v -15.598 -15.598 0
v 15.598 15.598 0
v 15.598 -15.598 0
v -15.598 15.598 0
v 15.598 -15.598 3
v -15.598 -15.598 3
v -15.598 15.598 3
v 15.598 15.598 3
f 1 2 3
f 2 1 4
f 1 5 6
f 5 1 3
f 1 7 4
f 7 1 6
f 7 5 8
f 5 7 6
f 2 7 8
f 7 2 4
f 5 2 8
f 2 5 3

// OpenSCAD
// Module names are of the form poly_<inkscape-path-id>().  As a result,
// you can associate a polygon in this OpenSCAD program with the corresponding
// SVG element in the Inkscape document by looking for the XML element with
// the attribute id="inkscape-path-id".

// fudge value is used to ensure that subtracted solids are a tad taller
// in the z dimension than the polygon being subtracted from.  This helps
// keep the resulting .stl file manifold.
fudge = 0.1;

module poly_path32(h)
{
  scale([25.4/90, -25.4/90, 1]) union()
  {
    linear_extrude(height=h)
      polygon([[-55.269925,-55.269925],[55.269925,-55.269925],[55.269925,55.269925],[-55.269925,55.269925],[-55.269925,-55.269925]]);
  }
}

module poly_path26(h)
{
  scale([25.4/90, -25.4/90, 1]) union()
  {
    linear_extrude(height=h)
      polygon([[-55.269925,-55.269925],[55.269925,-55.269925],[55.269925,55.269925],[-55.269925,55.269925],[-55.269925,-55.269925]]);
  }
}

module poly_path64(h)
{
  scale([25.4/90, -25.4/90, 1]) union()
  {
    linear_extrude(height=h)
      polygon([[-55.269925,-55.269925],[55.269925,-55.269925],[55.269925,55.269925],[-55.269925,55.269925],[-55.269925,-55.269925]]);
  }
}

module pcb_size(h)
{

poly_path32(h);
poly_path26(h);
poly_path64(h);
}

pcb_size(3);
